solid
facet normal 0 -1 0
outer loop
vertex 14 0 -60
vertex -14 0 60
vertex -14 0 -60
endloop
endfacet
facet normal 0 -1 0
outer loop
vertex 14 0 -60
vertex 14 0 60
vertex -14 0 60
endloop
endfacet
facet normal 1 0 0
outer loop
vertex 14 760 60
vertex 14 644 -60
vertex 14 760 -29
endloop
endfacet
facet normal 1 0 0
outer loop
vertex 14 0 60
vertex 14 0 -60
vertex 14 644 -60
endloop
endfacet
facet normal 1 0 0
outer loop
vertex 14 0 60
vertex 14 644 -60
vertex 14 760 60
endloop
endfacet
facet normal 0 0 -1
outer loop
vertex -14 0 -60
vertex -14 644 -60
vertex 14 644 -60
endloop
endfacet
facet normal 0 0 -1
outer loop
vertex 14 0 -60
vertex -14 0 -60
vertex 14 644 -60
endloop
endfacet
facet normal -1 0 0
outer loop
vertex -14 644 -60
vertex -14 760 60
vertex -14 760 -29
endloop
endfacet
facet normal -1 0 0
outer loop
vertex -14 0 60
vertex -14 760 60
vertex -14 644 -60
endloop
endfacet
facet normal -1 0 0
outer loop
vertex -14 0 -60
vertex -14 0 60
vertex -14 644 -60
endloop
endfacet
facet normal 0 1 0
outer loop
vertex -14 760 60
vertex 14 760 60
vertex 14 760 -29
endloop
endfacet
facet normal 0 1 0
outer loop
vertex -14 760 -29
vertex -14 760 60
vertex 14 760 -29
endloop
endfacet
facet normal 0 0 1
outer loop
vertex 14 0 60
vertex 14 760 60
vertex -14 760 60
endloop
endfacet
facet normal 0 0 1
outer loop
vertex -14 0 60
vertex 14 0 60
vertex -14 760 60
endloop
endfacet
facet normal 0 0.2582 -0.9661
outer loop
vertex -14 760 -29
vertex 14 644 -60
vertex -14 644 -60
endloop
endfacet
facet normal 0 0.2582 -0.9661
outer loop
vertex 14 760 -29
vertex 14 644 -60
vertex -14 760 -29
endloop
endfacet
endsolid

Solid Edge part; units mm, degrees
sketch "Sketch1" plane through (0, 0, 0) normal (0, -1, 0) x (1, 0, 0)
  line L0 (-14, -60) -> (14, -60)
  line L1 (14, -60) -> (14, 60)
  line L2 (14, 60) -> (-14, 60)
  line L3 (-14, 60) -> (-14, -60)
extrude "Protrusion1" add sketch "Sketch1" against normal blind 760
sketch "Sketch2" plane through (14, 380, 0) normal (1, 0, 0) x (0, 1, 0)
  line L0 (380, -60) -> (380, -29)
  line L1 (264, -60) -> (380, -29)
  line L2 (380, -60) -> (264, -60)
extrude "ExtrudedCutout_1" cut sketch "Sketch2" against normal blind 240.6223
properties material "Wood, Pine"
